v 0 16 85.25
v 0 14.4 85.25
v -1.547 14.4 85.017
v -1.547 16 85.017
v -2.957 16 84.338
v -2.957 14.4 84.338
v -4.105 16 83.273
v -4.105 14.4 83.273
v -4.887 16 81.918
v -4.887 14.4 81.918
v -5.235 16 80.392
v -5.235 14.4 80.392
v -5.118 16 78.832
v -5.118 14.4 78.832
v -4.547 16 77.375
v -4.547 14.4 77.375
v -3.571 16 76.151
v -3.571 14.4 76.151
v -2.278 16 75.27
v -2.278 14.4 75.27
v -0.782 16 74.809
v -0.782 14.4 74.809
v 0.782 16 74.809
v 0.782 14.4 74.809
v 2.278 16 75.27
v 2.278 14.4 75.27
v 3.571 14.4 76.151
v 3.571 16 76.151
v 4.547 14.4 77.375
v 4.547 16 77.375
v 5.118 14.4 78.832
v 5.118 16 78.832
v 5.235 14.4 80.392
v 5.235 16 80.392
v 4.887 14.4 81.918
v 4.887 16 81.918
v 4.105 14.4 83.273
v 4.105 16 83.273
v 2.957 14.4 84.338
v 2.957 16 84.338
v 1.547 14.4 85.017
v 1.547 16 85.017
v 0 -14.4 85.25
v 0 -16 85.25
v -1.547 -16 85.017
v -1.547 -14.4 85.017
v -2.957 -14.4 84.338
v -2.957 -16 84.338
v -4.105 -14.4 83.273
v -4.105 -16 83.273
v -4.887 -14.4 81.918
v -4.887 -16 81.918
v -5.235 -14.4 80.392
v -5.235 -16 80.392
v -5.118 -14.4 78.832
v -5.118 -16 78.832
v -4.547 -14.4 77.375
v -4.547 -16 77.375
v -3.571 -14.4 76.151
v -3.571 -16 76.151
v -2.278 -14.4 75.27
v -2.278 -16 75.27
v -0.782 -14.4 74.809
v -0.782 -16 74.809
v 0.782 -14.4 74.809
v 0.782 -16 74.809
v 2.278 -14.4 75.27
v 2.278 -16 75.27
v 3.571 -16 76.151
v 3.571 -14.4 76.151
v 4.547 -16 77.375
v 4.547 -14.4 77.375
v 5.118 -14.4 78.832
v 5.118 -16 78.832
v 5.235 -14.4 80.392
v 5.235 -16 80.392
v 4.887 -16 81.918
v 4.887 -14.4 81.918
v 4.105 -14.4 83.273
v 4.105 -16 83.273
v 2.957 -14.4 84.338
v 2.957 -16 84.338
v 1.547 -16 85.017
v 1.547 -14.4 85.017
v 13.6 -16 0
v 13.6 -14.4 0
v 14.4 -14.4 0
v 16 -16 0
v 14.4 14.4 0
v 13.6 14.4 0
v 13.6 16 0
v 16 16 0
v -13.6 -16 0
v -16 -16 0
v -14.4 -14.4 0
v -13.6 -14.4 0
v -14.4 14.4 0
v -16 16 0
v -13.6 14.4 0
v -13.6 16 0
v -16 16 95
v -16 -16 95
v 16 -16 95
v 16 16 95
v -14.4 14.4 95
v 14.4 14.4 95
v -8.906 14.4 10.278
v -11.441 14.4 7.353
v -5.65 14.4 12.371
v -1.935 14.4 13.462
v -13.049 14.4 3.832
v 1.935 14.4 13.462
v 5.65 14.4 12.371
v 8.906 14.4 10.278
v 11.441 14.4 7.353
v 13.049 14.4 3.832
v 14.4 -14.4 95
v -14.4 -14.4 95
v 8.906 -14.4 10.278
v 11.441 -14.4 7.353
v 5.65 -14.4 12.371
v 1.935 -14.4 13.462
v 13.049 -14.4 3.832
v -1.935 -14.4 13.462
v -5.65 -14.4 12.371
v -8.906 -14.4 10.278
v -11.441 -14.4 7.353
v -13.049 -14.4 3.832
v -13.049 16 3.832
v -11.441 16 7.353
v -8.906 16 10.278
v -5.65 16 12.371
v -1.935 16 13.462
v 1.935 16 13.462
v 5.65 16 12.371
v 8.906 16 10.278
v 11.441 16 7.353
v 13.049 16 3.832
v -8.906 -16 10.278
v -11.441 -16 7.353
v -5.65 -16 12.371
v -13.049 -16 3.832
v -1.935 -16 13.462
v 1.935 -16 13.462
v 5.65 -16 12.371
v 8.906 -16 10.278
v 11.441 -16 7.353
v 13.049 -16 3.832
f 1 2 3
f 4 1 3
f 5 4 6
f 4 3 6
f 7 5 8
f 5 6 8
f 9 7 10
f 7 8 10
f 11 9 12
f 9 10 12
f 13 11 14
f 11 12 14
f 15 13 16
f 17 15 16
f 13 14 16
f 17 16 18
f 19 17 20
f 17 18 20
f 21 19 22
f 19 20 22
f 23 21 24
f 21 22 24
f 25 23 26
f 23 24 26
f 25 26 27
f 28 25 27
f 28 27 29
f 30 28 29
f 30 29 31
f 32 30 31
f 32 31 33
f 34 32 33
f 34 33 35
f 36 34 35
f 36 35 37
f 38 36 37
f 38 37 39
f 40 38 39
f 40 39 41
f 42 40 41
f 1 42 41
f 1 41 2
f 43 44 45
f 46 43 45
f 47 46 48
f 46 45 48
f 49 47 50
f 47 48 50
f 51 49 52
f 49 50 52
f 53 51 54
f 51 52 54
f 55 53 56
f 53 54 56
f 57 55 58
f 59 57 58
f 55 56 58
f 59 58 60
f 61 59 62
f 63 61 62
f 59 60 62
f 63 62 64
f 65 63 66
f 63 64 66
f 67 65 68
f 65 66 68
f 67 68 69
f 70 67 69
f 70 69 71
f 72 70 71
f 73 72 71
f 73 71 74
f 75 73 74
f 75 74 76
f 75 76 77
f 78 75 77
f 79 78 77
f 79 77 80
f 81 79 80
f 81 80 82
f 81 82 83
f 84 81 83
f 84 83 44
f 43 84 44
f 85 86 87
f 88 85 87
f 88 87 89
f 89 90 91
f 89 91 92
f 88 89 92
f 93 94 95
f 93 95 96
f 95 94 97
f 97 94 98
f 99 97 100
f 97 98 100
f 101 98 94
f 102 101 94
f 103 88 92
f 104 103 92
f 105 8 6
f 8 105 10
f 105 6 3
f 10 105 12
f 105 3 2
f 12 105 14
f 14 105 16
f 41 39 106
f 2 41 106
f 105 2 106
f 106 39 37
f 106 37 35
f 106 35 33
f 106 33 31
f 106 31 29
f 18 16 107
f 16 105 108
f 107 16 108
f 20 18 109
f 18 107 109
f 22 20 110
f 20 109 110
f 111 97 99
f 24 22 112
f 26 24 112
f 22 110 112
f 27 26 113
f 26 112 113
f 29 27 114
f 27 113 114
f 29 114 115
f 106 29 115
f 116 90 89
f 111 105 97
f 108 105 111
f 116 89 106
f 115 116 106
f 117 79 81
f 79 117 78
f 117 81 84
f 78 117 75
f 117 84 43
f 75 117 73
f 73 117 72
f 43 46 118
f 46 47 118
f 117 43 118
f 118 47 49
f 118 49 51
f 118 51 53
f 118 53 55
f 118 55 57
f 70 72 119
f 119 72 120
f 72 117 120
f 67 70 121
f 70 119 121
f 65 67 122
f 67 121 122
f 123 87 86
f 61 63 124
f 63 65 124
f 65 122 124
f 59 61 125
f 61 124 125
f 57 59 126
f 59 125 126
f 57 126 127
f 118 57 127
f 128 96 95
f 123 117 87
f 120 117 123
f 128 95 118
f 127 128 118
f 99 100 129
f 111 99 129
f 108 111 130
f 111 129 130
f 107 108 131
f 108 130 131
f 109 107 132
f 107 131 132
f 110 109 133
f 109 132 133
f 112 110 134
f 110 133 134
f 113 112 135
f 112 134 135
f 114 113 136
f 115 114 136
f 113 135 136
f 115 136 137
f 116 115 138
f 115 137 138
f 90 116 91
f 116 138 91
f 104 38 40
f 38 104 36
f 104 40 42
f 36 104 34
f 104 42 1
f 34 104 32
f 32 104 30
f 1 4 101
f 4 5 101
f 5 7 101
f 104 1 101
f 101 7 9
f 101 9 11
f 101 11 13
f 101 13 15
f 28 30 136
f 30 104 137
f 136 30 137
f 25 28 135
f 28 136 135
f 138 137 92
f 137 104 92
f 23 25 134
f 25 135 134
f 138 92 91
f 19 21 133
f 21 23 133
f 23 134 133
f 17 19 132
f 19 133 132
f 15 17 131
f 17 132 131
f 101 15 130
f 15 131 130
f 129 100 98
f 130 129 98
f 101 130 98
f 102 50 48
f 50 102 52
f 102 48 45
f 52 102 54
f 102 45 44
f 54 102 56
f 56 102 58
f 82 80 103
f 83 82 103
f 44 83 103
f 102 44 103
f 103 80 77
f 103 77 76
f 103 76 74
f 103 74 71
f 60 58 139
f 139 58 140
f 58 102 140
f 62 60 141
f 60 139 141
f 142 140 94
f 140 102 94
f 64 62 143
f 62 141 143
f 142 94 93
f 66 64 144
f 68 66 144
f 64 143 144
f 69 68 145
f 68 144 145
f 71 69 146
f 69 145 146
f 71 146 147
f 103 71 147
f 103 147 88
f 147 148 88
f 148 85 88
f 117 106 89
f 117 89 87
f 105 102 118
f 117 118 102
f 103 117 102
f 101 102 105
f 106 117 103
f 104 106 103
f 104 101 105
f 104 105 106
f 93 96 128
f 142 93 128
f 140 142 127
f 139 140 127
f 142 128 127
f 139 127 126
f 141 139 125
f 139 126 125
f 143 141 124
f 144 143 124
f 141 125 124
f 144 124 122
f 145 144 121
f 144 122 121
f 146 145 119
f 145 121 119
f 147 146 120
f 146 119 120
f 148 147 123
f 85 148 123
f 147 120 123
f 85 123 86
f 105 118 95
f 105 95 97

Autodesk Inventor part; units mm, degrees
ref_plane "YZ Plane" through (0, 0, 0) normal (1, 0, 0) x (0, 1, 0)
ref_plane "XZ Plane" through (0, 0, 0) normal (0, 1, 0) x (-1, 0, 0)
ref_plane "XY Plane" through (0, 0, 0) normal (0, 0, 1) x (1, 0, 0)
sketch "スケッチ1" plane through (0, 0, 0) normal (0, 0, 1) x (1, 0, 0)
  line L0 (-16, -16) -> (16, -16)
  line L1 (16, -16) -> (16, 16)
  line L2 (16, 16) -> (-16, 16)
  line L3 (-16, 16) -> (-16, -16)
  line L4 (-16, -16) -> (16, 16) construction
  line L5 (16, -16) -> (-16, 16) construction
  line L6 (-14.4, 14.4) -> (14.4, 14.4)
  line L7 (14.4, 14.4) -> (14.4, -14.4)
  line L8 (14.4, -14.4) -> (-14.4, -14.4)
  line L9 (-14.4, -14.4) -> (-14.4, 14.4)
  point P0 (0, 0)
  dimension "d0" = 32
  dimension "d1" = 32
  dimension "d2" = 1.6
extrude "押し出し1" add sketch "スケッチ1" along normal blind 95
sketch "スケッチ2" plane through (-16, 16, 0) normal (0, 1, 0) x (1, 0, 0)
  circle A0 centre (16, 0) radius 13.6
  dimension "d5" = 27.2
extrude "押し出し2" cut sketch "スケッチ2" against normal blind 32
sketch "スケッチ3" plane through (-16, 16, 95) normal (0, 1, 0) x (1, 0, 0)
  line L0 (32, 0) -> (0, 0) projected
  point P0 (16, 95)
  point P1 (16, 15)
  dimension "d16" = 80
hole "穴1" at (0, 16, 80) direction (0, -1, 0) diameter 10.5 end through all
sketch "スケッチ4" plane through (-16, 16, 95) normal (0, 1, 0) x (1, 0, 0)
  circle A0 centre (16, 15) radius 13.6
  point P0 (16, 95)
  dimension "d17" = 80
  dimension "d18" = 27.2
properties part number "軸受上用"
